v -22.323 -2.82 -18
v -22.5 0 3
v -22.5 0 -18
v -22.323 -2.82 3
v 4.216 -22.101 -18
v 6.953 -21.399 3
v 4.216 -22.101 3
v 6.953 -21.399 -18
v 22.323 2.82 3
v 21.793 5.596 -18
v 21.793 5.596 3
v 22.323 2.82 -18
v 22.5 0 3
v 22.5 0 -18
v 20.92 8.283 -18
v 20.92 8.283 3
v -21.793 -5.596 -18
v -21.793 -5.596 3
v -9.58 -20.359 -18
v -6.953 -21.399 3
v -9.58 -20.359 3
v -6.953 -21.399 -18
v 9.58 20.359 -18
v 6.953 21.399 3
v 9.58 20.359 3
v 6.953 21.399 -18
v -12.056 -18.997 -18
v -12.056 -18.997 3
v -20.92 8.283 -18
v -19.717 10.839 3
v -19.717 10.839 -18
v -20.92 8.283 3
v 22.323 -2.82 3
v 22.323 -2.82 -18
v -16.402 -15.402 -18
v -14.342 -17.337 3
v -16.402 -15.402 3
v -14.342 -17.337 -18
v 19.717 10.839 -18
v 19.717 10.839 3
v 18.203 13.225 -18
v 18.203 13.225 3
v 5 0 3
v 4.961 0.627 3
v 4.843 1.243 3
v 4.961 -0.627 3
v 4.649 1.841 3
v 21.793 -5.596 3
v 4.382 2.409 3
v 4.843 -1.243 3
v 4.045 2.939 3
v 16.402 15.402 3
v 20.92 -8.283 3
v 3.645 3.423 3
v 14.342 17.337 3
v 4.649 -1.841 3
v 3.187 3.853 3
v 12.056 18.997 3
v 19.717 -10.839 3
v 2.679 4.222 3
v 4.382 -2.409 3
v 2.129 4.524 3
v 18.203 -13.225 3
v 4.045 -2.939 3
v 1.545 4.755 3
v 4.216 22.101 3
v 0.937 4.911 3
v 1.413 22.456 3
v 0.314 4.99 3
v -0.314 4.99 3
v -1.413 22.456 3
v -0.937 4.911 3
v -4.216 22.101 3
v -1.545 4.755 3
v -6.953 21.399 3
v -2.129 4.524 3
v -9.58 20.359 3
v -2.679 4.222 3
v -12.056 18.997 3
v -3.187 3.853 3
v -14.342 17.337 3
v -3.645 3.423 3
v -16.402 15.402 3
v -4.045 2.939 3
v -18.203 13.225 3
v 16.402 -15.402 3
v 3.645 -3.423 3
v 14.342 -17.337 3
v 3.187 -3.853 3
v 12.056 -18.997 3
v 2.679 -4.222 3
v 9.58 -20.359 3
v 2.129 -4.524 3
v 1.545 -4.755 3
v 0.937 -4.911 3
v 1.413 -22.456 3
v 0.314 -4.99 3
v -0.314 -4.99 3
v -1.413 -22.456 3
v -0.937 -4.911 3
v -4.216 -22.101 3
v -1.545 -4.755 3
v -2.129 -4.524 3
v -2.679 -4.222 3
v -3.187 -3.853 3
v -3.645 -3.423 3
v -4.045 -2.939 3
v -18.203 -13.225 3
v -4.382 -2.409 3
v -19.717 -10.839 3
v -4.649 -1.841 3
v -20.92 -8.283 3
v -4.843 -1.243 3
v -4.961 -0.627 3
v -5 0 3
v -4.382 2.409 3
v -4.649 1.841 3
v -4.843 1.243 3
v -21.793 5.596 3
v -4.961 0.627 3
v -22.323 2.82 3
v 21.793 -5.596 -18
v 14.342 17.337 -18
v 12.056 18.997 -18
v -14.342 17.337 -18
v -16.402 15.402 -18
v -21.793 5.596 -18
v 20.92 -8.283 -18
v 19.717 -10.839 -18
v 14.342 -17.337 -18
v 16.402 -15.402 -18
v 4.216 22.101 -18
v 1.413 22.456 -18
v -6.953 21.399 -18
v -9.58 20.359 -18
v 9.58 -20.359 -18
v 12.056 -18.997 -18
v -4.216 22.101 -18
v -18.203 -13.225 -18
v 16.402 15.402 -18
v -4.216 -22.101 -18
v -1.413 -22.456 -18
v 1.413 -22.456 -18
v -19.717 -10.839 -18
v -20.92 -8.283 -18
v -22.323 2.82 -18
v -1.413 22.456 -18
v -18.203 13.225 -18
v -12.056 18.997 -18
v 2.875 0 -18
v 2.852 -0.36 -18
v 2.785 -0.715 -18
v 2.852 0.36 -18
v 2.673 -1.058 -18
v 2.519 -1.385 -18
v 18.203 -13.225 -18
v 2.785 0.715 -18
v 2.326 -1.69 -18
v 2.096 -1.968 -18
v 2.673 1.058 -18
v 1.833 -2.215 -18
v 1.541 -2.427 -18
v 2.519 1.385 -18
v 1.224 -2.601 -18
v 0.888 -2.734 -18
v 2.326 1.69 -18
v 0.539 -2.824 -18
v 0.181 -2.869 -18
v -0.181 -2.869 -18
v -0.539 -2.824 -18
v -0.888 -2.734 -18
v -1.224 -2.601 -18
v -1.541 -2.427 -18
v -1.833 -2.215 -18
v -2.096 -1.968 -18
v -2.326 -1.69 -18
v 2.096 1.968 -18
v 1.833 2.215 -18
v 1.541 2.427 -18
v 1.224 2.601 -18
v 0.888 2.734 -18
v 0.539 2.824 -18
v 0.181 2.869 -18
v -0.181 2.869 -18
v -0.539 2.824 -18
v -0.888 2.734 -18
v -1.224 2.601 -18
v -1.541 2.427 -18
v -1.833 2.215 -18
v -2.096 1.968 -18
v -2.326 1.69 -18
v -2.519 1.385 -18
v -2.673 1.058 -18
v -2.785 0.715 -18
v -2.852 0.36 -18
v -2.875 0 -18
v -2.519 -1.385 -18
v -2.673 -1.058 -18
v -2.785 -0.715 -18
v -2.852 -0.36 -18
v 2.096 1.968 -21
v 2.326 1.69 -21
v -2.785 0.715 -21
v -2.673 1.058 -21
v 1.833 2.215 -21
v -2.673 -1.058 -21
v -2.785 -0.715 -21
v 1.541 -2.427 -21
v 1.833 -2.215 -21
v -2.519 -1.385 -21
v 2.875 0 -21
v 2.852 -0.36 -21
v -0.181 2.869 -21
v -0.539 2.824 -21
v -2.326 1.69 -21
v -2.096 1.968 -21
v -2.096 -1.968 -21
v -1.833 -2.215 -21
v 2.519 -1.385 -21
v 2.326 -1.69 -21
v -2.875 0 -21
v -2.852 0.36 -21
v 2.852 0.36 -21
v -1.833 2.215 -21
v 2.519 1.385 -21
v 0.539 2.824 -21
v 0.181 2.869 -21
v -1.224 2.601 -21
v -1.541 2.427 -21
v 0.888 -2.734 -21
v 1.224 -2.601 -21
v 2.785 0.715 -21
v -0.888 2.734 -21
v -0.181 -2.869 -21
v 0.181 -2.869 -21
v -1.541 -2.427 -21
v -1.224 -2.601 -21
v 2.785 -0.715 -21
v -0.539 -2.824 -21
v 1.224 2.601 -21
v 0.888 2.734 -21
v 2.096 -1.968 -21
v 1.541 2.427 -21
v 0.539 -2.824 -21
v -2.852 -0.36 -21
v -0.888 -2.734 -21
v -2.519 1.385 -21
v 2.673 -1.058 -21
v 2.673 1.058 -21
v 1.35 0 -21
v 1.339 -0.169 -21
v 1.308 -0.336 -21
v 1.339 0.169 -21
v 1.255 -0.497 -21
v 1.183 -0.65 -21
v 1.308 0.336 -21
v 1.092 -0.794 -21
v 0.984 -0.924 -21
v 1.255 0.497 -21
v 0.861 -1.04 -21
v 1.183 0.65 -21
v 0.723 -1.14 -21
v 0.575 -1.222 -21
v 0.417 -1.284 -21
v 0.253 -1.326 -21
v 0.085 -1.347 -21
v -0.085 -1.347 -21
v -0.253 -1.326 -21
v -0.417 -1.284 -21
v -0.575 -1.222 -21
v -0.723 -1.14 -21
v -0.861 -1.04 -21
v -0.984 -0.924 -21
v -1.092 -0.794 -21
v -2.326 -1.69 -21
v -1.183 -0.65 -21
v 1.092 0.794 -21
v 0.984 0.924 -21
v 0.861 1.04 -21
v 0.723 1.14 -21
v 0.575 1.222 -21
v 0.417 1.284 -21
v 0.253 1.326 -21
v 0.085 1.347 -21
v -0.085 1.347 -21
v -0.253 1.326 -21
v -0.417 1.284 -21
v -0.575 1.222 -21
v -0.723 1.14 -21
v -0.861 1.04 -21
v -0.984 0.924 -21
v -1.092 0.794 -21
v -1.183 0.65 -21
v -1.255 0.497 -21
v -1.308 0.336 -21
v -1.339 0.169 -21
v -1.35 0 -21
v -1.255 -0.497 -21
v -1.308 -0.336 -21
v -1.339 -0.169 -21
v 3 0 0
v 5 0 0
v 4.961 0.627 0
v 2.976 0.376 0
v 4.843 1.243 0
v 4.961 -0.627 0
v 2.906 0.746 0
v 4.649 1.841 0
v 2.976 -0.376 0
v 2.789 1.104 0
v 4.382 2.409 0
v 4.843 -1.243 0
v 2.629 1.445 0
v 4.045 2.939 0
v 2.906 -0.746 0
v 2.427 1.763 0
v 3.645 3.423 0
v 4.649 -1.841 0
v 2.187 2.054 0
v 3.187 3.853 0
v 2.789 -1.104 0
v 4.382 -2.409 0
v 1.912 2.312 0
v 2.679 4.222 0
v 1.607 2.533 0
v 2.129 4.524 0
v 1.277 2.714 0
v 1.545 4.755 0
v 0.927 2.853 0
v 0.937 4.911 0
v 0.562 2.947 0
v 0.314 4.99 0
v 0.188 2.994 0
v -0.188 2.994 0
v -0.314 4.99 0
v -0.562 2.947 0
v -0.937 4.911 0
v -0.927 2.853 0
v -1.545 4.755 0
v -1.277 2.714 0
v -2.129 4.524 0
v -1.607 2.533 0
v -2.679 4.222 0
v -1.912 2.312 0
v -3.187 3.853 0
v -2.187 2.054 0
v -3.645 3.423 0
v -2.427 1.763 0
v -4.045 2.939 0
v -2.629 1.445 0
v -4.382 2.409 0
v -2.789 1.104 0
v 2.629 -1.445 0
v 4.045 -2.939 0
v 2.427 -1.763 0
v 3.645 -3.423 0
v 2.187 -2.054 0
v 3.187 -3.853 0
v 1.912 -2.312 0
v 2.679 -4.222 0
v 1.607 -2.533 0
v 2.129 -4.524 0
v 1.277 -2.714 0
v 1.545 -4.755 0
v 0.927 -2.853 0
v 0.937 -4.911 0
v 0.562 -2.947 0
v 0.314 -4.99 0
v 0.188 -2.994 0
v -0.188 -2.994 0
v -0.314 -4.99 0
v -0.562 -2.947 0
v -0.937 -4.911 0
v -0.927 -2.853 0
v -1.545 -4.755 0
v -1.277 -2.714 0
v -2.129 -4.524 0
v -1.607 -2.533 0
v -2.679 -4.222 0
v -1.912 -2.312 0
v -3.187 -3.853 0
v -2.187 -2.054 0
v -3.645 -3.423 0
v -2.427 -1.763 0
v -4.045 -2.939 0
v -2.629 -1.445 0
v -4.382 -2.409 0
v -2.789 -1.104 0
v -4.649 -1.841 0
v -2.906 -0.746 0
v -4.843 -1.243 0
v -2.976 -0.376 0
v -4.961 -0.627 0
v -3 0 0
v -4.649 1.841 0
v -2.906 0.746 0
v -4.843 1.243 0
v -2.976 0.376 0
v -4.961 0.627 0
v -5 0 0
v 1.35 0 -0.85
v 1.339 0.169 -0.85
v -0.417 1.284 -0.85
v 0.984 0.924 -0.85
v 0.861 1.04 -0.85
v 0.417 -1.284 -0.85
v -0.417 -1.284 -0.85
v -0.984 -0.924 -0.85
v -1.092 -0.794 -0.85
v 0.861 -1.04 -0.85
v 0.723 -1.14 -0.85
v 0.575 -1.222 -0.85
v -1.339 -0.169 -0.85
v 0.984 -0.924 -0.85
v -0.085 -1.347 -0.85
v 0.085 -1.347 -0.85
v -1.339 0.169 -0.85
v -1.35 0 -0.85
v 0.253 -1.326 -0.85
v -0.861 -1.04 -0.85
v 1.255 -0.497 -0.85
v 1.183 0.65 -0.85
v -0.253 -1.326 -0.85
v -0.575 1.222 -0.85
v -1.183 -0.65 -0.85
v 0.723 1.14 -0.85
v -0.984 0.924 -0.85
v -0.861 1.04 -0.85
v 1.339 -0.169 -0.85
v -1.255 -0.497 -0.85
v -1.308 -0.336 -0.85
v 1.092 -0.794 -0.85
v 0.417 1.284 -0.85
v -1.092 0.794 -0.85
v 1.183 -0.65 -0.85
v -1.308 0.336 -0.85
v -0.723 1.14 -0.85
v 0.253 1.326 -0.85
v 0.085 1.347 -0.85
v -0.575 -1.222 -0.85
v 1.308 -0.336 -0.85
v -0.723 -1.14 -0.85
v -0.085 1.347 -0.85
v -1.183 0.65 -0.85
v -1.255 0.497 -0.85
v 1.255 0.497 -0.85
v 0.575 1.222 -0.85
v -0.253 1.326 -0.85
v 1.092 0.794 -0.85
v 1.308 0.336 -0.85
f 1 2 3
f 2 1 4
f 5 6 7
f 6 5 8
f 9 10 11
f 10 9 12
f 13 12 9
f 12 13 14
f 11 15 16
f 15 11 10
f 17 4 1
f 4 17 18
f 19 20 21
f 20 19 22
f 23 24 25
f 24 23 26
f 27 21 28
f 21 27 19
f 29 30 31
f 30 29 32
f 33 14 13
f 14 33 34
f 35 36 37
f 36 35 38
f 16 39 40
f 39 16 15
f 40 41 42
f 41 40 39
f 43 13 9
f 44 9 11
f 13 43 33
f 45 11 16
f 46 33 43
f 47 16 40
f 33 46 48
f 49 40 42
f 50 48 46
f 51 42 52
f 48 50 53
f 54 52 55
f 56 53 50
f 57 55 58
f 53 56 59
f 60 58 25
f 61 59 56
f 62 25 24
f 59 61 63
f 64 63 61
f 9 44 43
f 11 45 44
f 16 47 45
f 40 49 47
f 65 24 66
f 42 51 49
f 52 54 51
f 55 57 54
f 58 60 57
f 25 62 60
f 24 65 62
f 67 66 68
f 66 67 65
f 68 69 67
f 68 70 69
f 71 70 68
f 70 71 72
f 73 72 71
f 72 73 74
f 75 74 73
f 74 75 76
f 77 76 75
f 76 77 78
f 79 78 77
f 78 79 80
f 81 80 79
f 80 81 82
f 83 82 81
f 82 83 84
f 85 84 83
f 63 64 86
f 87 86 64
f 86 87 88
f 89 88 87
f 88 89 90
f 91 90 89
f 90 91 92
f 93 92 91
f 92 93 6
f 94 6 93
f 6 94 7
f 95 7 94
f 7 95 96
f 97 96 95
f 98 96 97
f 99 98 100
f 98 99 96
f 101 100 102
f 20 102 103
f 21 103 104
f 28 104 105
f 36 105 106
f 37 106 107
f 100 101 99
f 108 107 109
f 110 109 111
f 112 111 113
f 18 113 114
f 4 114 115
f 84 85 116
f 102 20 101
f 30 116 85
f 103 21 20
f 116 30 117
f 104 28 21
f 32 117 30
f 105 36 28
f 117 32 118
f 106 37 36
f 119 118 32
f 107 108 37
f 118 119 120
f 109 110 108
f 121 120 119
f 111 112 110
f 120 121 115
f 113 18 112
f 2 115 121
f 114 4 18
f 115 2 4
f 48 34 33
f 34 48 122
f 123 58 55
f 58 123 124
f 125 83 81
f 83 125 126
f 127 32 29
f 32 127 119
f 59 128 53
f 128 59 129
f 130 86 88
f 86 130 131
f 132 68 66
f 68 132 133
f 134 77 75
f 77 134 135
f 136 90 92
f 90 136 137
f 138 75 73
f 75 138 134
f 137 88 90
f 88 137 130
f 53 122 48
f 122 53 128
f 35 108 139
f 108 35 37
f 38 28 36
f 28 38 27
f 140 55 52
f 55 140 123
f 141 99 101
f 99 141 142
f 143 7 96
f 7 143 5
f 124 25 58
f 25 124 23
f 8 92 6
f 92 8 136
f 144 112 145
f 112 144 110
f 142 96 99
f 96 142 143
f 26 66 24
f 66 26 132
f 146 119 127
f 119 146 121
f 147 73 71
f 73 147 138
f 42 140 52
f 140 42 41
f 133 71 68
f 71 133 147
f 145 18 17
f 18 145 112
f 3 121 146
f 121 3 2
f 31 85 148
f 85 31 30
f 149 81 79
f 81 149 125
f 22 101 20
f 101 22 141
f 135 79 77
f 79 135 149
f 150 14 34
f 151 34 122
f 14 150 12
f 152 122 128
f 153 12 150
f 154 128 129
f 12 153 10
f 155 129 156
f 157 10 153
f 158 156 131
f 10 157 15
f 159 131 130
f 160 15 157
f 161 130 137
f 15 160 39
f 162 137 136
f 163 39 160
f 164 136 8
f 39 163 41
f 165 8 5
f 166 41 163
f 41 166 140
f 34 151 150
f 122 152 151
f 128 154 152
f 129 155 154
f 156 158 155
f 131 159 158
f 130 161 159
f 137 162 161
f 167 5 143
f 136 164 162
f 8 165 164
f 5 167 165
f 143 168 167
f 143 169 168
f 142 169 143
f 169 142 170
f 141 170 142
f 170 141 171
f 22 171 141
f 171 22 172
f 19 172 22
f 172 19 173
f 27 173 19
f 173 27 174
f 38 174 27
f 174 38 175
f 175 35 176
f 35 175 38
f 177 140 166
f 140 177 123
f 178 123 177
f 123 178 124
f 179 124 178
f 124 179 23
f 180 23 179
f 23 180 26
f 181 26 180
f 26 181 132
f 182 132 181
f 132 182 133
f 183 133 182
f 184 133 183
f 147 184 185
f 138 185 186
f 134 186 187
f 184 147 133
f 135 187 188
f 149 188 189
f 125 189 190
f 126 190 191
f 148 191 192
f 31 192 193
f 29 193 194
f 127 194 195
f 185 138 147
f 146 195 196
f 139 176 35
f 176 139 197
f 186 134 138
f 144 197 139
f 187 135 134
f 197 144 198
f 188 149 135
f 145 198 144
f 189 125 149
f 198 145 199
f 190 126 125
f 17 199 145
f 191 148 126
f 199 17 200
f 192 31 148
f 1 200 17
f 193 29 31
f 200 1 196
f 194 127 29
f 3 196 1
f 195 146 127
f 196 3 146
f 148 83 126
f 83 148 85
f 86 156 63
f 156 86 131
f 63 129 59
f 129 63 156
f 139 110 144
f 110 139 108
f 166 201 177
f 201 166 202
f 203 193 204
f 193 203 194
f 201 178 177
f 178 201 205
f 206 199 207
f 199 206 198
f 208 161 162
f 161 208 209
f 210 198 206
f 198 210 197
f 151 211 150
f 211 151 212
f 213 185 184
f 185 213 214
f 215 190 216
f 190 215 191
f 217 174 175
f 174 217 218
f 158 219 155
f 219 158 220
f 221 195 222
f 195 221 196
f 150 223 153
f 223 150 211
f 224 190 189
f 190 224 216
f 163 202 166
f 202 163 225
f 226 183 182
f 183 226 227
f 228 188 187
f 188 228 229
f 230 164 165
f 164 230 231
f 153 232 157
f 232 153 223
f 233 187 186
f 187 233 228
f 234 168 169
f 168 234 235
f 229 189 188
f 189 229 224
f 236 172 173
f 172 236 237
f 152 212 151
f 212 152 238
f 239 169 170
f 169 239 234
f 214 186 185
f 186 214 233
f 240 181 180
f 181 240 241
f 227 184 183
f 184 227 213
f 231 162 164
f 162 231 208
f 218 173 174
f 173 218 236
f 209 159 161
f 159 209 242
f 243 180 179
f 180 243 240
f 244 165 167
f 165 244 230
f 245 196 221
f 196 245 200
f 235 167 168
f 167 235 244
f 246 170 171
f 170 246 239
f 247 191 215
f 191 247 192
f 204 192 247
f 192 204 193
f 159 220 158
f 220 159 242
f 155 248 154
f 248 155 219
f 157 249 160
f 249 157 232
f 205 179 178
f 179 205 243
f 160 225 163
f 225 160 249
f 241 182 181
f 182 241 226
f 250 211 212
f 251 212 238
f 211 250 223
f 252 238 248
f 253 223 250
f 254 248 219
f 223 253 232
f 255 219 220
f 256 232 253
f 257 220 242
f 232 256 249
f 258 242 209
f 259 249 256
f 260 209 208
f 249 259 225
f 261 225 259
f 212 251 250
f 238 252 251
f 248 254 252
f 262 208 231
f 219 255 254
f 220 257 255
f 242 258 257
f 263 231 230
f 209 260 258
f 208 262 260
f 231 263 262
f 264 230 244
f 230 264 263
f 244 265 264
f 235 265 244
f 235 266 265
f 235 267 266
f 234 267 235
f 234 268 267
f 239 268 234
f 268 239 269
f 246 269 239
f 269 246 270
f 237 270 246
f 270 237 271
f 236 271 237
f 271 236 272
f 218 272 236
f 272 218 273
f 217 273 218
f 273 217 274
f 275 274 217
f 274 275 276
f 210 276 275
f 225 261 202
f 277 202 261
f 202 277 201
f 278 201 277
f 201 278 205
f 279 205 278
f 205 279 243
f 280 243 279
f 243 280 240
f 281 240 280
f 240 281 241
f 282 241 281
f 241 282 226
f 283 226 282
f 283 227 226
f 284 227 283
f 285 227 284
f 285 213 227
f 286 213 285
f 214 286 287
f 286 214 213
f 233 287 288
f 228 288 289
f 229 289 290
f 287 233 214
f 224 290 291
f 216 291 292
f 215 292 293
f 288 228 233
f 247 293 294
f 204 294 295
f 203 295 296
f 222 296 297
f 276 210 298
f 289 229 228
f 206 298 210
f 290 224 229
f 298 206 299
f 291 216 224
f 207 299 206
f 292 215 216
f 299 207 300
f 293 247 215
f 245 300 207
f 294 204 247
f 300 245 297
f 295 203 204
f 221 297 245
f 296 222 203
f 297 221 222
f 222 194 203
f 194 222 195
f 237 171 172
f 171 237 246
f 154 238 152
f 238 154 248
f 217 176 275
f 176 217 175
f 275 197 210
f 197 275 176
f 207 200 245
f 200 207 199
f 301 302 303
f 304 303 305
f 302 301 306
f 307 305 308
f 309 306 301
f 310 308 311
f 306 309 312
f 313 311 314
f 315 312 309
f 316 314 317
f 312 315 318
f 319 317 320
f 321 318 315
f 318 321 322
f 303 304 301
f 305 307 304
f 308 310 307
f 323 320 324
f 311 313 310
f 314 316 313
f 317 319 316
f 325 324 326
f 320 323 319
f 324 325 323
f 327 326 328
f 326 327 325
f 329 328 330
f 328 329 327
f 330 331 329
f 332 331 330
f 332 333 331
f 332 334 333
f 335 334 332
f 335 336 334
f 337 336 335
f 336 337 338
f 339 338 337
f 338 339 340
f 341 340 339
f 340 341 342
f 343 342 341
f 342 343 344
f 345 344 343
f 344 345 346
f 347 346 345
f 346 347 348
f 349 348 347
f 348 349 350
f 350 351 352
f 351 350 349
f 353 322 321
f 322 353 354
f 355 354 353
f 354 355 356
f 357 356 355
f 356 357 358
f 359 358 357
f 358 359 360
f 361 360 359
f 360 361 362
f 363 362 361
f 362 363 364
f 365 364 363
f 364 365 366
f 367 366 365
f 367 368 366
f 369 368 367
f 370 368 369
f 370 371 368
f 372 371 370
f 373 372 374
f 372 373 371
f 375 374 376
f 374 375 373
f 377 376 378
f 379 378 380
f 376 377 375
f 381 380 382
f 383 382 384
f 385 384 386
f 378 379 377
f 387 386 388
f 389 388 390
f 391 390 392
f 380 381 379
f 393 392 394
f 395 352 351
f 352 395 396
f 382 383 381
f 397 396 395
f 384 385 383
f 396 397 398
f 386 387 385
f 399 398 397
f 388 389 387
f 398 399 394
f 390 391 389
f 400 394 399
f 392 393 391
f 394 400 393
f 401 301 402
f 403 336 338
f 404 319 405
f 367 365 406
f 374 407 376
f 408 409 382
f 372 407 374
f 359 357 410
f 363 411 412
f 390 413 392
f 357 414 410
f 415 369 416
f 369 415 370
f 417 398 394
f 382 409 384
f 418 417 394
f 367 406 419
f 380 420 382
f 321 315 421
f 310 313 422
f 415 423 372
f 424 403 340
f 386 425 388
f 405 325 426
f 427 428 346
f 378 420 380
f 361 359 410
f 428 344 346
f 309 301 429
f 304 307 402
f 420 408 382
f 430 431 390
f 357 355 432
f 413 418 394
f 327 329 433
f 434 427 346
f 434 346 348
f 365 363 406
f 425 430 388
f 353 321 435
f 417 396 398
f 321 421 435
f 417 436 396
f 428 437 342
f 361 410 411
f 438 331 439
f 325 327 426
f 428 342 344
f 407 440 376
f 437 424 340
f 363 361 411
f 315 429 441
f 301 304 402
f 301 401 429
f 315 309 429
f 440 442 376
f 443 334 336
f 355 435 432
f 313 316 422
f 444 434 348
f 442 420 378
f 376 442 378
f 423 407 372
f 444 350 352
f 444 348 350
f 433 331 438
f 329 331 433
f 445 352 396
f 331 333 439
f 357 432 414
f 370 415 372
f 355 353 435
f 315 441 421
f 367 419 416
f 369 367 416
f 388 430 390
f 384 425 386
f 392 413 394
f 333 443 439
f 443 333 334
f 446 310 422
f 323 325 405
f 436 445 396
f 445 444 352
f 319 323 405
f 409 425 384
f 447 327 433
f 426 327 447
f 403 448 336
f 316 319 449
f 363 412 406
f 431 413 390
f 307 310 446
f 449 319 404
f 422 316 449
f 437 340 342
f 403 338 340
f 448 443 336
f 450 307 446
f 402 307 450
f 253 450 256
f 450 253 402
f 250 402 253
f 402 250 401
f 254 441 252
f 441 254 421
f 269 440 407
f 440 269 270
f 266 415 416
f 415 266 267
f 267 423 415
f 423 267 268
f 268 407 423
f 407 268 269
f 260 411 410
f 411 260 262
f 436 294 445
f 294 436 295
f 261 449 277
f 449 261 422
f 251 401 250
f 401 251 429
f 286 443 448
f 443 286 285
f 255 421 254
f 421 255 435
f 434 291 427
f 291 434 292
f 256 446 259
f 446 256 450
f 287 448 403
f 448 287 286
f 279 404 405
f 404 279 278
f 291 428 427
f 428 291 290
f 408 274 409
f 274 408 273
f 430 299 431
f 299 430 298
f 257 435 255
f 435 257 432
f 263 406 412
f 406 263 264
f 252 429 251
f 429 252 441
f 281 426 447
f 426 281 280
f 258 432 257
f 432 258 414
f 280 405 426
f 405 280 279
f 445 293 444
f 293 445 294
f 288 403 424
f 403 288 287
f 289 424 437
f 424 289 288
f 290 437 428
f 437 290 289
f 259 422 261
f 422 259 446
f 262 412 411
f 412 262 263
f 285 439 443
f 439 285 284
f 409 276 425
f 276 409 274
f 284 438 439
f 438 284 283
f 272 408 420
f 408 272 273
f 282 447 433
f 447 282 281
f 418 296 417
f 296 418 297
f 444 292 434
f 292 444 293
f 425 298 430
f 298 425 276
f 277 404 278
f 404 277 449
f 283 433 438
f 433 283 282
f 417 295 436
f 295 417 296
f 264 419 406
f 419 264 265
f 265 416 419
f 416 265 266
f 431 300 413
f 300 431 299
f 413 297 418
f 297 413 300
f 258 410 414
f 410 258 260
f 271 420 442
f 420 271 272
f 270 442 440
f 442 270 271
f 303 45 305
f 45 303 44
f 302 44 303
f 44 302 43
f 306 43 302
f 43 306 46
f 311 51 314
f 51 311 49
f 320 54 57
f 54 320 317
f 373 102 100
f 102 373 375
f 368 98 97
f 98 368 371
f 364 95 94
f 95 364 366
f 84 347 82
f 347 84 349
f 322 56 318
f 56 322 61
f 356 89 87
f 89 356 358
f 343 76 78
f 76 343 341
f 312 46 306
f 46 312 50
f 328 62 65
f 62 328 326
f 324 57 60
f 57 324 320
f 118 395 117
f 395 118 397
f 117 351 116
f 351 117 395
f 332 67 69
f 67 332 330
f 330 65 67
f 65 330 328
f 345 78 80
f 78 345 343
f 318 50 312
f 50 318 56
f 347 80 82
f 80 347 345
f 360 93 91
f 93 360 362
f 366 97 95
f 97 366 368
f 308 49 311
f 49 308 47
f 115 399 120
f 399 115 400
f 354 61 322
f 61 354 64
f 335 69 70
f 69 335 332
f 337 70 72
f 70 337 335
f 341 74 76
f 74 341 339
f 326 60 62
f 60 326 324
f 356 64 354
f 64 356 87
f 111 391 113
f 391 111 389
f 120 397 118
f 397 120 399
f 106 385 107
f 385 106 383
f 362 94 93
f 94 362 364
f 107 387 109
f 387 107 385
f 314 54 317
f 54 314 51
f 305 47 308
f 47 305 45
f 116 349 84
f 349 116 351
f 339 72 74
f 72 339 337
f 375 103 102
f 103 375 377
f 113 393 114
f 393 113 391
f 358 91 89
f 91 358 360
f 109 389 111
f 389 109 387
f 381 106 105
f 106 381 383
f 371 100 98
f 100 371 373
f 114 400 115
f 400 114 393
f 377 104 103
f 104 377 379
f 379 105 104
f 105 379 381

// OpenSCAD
$fn = 50;

difference() {
	union() {
		translate(v = [0, 0, -18.0]) {
			cylinder(h = 21, r = 22.5);
		}
		#translate(v = [0, 0, -21.0]) {
			cylinder(h = 21, r = 2.875);
		}
	}
	union() {
		translate(v = [0, 0, 0]) {
			rotate(a = [0, 0, 0]) {
				difference() {
					union() {
						translate(v = [0, 0, -21.0]) {
							cylinder(h = 21, r = 1.0);
						}
						translate(v = [0, 0, -0.85]) {
							cylinder(h = 0.85, r1 = 1.35, r2 = 3.0);
						}
						translate(v = [0, 0, -21.0]) {
							cylinder(h = 21, r = 1.35);
						}
						translate(v = [0, 0, -21.0]) {
							cylinder(h = 21, r = 1.0);
						}
					}
					union();
				}
			}
		}
		#cylinder(h = 3, r = 5.0);
	}
}
